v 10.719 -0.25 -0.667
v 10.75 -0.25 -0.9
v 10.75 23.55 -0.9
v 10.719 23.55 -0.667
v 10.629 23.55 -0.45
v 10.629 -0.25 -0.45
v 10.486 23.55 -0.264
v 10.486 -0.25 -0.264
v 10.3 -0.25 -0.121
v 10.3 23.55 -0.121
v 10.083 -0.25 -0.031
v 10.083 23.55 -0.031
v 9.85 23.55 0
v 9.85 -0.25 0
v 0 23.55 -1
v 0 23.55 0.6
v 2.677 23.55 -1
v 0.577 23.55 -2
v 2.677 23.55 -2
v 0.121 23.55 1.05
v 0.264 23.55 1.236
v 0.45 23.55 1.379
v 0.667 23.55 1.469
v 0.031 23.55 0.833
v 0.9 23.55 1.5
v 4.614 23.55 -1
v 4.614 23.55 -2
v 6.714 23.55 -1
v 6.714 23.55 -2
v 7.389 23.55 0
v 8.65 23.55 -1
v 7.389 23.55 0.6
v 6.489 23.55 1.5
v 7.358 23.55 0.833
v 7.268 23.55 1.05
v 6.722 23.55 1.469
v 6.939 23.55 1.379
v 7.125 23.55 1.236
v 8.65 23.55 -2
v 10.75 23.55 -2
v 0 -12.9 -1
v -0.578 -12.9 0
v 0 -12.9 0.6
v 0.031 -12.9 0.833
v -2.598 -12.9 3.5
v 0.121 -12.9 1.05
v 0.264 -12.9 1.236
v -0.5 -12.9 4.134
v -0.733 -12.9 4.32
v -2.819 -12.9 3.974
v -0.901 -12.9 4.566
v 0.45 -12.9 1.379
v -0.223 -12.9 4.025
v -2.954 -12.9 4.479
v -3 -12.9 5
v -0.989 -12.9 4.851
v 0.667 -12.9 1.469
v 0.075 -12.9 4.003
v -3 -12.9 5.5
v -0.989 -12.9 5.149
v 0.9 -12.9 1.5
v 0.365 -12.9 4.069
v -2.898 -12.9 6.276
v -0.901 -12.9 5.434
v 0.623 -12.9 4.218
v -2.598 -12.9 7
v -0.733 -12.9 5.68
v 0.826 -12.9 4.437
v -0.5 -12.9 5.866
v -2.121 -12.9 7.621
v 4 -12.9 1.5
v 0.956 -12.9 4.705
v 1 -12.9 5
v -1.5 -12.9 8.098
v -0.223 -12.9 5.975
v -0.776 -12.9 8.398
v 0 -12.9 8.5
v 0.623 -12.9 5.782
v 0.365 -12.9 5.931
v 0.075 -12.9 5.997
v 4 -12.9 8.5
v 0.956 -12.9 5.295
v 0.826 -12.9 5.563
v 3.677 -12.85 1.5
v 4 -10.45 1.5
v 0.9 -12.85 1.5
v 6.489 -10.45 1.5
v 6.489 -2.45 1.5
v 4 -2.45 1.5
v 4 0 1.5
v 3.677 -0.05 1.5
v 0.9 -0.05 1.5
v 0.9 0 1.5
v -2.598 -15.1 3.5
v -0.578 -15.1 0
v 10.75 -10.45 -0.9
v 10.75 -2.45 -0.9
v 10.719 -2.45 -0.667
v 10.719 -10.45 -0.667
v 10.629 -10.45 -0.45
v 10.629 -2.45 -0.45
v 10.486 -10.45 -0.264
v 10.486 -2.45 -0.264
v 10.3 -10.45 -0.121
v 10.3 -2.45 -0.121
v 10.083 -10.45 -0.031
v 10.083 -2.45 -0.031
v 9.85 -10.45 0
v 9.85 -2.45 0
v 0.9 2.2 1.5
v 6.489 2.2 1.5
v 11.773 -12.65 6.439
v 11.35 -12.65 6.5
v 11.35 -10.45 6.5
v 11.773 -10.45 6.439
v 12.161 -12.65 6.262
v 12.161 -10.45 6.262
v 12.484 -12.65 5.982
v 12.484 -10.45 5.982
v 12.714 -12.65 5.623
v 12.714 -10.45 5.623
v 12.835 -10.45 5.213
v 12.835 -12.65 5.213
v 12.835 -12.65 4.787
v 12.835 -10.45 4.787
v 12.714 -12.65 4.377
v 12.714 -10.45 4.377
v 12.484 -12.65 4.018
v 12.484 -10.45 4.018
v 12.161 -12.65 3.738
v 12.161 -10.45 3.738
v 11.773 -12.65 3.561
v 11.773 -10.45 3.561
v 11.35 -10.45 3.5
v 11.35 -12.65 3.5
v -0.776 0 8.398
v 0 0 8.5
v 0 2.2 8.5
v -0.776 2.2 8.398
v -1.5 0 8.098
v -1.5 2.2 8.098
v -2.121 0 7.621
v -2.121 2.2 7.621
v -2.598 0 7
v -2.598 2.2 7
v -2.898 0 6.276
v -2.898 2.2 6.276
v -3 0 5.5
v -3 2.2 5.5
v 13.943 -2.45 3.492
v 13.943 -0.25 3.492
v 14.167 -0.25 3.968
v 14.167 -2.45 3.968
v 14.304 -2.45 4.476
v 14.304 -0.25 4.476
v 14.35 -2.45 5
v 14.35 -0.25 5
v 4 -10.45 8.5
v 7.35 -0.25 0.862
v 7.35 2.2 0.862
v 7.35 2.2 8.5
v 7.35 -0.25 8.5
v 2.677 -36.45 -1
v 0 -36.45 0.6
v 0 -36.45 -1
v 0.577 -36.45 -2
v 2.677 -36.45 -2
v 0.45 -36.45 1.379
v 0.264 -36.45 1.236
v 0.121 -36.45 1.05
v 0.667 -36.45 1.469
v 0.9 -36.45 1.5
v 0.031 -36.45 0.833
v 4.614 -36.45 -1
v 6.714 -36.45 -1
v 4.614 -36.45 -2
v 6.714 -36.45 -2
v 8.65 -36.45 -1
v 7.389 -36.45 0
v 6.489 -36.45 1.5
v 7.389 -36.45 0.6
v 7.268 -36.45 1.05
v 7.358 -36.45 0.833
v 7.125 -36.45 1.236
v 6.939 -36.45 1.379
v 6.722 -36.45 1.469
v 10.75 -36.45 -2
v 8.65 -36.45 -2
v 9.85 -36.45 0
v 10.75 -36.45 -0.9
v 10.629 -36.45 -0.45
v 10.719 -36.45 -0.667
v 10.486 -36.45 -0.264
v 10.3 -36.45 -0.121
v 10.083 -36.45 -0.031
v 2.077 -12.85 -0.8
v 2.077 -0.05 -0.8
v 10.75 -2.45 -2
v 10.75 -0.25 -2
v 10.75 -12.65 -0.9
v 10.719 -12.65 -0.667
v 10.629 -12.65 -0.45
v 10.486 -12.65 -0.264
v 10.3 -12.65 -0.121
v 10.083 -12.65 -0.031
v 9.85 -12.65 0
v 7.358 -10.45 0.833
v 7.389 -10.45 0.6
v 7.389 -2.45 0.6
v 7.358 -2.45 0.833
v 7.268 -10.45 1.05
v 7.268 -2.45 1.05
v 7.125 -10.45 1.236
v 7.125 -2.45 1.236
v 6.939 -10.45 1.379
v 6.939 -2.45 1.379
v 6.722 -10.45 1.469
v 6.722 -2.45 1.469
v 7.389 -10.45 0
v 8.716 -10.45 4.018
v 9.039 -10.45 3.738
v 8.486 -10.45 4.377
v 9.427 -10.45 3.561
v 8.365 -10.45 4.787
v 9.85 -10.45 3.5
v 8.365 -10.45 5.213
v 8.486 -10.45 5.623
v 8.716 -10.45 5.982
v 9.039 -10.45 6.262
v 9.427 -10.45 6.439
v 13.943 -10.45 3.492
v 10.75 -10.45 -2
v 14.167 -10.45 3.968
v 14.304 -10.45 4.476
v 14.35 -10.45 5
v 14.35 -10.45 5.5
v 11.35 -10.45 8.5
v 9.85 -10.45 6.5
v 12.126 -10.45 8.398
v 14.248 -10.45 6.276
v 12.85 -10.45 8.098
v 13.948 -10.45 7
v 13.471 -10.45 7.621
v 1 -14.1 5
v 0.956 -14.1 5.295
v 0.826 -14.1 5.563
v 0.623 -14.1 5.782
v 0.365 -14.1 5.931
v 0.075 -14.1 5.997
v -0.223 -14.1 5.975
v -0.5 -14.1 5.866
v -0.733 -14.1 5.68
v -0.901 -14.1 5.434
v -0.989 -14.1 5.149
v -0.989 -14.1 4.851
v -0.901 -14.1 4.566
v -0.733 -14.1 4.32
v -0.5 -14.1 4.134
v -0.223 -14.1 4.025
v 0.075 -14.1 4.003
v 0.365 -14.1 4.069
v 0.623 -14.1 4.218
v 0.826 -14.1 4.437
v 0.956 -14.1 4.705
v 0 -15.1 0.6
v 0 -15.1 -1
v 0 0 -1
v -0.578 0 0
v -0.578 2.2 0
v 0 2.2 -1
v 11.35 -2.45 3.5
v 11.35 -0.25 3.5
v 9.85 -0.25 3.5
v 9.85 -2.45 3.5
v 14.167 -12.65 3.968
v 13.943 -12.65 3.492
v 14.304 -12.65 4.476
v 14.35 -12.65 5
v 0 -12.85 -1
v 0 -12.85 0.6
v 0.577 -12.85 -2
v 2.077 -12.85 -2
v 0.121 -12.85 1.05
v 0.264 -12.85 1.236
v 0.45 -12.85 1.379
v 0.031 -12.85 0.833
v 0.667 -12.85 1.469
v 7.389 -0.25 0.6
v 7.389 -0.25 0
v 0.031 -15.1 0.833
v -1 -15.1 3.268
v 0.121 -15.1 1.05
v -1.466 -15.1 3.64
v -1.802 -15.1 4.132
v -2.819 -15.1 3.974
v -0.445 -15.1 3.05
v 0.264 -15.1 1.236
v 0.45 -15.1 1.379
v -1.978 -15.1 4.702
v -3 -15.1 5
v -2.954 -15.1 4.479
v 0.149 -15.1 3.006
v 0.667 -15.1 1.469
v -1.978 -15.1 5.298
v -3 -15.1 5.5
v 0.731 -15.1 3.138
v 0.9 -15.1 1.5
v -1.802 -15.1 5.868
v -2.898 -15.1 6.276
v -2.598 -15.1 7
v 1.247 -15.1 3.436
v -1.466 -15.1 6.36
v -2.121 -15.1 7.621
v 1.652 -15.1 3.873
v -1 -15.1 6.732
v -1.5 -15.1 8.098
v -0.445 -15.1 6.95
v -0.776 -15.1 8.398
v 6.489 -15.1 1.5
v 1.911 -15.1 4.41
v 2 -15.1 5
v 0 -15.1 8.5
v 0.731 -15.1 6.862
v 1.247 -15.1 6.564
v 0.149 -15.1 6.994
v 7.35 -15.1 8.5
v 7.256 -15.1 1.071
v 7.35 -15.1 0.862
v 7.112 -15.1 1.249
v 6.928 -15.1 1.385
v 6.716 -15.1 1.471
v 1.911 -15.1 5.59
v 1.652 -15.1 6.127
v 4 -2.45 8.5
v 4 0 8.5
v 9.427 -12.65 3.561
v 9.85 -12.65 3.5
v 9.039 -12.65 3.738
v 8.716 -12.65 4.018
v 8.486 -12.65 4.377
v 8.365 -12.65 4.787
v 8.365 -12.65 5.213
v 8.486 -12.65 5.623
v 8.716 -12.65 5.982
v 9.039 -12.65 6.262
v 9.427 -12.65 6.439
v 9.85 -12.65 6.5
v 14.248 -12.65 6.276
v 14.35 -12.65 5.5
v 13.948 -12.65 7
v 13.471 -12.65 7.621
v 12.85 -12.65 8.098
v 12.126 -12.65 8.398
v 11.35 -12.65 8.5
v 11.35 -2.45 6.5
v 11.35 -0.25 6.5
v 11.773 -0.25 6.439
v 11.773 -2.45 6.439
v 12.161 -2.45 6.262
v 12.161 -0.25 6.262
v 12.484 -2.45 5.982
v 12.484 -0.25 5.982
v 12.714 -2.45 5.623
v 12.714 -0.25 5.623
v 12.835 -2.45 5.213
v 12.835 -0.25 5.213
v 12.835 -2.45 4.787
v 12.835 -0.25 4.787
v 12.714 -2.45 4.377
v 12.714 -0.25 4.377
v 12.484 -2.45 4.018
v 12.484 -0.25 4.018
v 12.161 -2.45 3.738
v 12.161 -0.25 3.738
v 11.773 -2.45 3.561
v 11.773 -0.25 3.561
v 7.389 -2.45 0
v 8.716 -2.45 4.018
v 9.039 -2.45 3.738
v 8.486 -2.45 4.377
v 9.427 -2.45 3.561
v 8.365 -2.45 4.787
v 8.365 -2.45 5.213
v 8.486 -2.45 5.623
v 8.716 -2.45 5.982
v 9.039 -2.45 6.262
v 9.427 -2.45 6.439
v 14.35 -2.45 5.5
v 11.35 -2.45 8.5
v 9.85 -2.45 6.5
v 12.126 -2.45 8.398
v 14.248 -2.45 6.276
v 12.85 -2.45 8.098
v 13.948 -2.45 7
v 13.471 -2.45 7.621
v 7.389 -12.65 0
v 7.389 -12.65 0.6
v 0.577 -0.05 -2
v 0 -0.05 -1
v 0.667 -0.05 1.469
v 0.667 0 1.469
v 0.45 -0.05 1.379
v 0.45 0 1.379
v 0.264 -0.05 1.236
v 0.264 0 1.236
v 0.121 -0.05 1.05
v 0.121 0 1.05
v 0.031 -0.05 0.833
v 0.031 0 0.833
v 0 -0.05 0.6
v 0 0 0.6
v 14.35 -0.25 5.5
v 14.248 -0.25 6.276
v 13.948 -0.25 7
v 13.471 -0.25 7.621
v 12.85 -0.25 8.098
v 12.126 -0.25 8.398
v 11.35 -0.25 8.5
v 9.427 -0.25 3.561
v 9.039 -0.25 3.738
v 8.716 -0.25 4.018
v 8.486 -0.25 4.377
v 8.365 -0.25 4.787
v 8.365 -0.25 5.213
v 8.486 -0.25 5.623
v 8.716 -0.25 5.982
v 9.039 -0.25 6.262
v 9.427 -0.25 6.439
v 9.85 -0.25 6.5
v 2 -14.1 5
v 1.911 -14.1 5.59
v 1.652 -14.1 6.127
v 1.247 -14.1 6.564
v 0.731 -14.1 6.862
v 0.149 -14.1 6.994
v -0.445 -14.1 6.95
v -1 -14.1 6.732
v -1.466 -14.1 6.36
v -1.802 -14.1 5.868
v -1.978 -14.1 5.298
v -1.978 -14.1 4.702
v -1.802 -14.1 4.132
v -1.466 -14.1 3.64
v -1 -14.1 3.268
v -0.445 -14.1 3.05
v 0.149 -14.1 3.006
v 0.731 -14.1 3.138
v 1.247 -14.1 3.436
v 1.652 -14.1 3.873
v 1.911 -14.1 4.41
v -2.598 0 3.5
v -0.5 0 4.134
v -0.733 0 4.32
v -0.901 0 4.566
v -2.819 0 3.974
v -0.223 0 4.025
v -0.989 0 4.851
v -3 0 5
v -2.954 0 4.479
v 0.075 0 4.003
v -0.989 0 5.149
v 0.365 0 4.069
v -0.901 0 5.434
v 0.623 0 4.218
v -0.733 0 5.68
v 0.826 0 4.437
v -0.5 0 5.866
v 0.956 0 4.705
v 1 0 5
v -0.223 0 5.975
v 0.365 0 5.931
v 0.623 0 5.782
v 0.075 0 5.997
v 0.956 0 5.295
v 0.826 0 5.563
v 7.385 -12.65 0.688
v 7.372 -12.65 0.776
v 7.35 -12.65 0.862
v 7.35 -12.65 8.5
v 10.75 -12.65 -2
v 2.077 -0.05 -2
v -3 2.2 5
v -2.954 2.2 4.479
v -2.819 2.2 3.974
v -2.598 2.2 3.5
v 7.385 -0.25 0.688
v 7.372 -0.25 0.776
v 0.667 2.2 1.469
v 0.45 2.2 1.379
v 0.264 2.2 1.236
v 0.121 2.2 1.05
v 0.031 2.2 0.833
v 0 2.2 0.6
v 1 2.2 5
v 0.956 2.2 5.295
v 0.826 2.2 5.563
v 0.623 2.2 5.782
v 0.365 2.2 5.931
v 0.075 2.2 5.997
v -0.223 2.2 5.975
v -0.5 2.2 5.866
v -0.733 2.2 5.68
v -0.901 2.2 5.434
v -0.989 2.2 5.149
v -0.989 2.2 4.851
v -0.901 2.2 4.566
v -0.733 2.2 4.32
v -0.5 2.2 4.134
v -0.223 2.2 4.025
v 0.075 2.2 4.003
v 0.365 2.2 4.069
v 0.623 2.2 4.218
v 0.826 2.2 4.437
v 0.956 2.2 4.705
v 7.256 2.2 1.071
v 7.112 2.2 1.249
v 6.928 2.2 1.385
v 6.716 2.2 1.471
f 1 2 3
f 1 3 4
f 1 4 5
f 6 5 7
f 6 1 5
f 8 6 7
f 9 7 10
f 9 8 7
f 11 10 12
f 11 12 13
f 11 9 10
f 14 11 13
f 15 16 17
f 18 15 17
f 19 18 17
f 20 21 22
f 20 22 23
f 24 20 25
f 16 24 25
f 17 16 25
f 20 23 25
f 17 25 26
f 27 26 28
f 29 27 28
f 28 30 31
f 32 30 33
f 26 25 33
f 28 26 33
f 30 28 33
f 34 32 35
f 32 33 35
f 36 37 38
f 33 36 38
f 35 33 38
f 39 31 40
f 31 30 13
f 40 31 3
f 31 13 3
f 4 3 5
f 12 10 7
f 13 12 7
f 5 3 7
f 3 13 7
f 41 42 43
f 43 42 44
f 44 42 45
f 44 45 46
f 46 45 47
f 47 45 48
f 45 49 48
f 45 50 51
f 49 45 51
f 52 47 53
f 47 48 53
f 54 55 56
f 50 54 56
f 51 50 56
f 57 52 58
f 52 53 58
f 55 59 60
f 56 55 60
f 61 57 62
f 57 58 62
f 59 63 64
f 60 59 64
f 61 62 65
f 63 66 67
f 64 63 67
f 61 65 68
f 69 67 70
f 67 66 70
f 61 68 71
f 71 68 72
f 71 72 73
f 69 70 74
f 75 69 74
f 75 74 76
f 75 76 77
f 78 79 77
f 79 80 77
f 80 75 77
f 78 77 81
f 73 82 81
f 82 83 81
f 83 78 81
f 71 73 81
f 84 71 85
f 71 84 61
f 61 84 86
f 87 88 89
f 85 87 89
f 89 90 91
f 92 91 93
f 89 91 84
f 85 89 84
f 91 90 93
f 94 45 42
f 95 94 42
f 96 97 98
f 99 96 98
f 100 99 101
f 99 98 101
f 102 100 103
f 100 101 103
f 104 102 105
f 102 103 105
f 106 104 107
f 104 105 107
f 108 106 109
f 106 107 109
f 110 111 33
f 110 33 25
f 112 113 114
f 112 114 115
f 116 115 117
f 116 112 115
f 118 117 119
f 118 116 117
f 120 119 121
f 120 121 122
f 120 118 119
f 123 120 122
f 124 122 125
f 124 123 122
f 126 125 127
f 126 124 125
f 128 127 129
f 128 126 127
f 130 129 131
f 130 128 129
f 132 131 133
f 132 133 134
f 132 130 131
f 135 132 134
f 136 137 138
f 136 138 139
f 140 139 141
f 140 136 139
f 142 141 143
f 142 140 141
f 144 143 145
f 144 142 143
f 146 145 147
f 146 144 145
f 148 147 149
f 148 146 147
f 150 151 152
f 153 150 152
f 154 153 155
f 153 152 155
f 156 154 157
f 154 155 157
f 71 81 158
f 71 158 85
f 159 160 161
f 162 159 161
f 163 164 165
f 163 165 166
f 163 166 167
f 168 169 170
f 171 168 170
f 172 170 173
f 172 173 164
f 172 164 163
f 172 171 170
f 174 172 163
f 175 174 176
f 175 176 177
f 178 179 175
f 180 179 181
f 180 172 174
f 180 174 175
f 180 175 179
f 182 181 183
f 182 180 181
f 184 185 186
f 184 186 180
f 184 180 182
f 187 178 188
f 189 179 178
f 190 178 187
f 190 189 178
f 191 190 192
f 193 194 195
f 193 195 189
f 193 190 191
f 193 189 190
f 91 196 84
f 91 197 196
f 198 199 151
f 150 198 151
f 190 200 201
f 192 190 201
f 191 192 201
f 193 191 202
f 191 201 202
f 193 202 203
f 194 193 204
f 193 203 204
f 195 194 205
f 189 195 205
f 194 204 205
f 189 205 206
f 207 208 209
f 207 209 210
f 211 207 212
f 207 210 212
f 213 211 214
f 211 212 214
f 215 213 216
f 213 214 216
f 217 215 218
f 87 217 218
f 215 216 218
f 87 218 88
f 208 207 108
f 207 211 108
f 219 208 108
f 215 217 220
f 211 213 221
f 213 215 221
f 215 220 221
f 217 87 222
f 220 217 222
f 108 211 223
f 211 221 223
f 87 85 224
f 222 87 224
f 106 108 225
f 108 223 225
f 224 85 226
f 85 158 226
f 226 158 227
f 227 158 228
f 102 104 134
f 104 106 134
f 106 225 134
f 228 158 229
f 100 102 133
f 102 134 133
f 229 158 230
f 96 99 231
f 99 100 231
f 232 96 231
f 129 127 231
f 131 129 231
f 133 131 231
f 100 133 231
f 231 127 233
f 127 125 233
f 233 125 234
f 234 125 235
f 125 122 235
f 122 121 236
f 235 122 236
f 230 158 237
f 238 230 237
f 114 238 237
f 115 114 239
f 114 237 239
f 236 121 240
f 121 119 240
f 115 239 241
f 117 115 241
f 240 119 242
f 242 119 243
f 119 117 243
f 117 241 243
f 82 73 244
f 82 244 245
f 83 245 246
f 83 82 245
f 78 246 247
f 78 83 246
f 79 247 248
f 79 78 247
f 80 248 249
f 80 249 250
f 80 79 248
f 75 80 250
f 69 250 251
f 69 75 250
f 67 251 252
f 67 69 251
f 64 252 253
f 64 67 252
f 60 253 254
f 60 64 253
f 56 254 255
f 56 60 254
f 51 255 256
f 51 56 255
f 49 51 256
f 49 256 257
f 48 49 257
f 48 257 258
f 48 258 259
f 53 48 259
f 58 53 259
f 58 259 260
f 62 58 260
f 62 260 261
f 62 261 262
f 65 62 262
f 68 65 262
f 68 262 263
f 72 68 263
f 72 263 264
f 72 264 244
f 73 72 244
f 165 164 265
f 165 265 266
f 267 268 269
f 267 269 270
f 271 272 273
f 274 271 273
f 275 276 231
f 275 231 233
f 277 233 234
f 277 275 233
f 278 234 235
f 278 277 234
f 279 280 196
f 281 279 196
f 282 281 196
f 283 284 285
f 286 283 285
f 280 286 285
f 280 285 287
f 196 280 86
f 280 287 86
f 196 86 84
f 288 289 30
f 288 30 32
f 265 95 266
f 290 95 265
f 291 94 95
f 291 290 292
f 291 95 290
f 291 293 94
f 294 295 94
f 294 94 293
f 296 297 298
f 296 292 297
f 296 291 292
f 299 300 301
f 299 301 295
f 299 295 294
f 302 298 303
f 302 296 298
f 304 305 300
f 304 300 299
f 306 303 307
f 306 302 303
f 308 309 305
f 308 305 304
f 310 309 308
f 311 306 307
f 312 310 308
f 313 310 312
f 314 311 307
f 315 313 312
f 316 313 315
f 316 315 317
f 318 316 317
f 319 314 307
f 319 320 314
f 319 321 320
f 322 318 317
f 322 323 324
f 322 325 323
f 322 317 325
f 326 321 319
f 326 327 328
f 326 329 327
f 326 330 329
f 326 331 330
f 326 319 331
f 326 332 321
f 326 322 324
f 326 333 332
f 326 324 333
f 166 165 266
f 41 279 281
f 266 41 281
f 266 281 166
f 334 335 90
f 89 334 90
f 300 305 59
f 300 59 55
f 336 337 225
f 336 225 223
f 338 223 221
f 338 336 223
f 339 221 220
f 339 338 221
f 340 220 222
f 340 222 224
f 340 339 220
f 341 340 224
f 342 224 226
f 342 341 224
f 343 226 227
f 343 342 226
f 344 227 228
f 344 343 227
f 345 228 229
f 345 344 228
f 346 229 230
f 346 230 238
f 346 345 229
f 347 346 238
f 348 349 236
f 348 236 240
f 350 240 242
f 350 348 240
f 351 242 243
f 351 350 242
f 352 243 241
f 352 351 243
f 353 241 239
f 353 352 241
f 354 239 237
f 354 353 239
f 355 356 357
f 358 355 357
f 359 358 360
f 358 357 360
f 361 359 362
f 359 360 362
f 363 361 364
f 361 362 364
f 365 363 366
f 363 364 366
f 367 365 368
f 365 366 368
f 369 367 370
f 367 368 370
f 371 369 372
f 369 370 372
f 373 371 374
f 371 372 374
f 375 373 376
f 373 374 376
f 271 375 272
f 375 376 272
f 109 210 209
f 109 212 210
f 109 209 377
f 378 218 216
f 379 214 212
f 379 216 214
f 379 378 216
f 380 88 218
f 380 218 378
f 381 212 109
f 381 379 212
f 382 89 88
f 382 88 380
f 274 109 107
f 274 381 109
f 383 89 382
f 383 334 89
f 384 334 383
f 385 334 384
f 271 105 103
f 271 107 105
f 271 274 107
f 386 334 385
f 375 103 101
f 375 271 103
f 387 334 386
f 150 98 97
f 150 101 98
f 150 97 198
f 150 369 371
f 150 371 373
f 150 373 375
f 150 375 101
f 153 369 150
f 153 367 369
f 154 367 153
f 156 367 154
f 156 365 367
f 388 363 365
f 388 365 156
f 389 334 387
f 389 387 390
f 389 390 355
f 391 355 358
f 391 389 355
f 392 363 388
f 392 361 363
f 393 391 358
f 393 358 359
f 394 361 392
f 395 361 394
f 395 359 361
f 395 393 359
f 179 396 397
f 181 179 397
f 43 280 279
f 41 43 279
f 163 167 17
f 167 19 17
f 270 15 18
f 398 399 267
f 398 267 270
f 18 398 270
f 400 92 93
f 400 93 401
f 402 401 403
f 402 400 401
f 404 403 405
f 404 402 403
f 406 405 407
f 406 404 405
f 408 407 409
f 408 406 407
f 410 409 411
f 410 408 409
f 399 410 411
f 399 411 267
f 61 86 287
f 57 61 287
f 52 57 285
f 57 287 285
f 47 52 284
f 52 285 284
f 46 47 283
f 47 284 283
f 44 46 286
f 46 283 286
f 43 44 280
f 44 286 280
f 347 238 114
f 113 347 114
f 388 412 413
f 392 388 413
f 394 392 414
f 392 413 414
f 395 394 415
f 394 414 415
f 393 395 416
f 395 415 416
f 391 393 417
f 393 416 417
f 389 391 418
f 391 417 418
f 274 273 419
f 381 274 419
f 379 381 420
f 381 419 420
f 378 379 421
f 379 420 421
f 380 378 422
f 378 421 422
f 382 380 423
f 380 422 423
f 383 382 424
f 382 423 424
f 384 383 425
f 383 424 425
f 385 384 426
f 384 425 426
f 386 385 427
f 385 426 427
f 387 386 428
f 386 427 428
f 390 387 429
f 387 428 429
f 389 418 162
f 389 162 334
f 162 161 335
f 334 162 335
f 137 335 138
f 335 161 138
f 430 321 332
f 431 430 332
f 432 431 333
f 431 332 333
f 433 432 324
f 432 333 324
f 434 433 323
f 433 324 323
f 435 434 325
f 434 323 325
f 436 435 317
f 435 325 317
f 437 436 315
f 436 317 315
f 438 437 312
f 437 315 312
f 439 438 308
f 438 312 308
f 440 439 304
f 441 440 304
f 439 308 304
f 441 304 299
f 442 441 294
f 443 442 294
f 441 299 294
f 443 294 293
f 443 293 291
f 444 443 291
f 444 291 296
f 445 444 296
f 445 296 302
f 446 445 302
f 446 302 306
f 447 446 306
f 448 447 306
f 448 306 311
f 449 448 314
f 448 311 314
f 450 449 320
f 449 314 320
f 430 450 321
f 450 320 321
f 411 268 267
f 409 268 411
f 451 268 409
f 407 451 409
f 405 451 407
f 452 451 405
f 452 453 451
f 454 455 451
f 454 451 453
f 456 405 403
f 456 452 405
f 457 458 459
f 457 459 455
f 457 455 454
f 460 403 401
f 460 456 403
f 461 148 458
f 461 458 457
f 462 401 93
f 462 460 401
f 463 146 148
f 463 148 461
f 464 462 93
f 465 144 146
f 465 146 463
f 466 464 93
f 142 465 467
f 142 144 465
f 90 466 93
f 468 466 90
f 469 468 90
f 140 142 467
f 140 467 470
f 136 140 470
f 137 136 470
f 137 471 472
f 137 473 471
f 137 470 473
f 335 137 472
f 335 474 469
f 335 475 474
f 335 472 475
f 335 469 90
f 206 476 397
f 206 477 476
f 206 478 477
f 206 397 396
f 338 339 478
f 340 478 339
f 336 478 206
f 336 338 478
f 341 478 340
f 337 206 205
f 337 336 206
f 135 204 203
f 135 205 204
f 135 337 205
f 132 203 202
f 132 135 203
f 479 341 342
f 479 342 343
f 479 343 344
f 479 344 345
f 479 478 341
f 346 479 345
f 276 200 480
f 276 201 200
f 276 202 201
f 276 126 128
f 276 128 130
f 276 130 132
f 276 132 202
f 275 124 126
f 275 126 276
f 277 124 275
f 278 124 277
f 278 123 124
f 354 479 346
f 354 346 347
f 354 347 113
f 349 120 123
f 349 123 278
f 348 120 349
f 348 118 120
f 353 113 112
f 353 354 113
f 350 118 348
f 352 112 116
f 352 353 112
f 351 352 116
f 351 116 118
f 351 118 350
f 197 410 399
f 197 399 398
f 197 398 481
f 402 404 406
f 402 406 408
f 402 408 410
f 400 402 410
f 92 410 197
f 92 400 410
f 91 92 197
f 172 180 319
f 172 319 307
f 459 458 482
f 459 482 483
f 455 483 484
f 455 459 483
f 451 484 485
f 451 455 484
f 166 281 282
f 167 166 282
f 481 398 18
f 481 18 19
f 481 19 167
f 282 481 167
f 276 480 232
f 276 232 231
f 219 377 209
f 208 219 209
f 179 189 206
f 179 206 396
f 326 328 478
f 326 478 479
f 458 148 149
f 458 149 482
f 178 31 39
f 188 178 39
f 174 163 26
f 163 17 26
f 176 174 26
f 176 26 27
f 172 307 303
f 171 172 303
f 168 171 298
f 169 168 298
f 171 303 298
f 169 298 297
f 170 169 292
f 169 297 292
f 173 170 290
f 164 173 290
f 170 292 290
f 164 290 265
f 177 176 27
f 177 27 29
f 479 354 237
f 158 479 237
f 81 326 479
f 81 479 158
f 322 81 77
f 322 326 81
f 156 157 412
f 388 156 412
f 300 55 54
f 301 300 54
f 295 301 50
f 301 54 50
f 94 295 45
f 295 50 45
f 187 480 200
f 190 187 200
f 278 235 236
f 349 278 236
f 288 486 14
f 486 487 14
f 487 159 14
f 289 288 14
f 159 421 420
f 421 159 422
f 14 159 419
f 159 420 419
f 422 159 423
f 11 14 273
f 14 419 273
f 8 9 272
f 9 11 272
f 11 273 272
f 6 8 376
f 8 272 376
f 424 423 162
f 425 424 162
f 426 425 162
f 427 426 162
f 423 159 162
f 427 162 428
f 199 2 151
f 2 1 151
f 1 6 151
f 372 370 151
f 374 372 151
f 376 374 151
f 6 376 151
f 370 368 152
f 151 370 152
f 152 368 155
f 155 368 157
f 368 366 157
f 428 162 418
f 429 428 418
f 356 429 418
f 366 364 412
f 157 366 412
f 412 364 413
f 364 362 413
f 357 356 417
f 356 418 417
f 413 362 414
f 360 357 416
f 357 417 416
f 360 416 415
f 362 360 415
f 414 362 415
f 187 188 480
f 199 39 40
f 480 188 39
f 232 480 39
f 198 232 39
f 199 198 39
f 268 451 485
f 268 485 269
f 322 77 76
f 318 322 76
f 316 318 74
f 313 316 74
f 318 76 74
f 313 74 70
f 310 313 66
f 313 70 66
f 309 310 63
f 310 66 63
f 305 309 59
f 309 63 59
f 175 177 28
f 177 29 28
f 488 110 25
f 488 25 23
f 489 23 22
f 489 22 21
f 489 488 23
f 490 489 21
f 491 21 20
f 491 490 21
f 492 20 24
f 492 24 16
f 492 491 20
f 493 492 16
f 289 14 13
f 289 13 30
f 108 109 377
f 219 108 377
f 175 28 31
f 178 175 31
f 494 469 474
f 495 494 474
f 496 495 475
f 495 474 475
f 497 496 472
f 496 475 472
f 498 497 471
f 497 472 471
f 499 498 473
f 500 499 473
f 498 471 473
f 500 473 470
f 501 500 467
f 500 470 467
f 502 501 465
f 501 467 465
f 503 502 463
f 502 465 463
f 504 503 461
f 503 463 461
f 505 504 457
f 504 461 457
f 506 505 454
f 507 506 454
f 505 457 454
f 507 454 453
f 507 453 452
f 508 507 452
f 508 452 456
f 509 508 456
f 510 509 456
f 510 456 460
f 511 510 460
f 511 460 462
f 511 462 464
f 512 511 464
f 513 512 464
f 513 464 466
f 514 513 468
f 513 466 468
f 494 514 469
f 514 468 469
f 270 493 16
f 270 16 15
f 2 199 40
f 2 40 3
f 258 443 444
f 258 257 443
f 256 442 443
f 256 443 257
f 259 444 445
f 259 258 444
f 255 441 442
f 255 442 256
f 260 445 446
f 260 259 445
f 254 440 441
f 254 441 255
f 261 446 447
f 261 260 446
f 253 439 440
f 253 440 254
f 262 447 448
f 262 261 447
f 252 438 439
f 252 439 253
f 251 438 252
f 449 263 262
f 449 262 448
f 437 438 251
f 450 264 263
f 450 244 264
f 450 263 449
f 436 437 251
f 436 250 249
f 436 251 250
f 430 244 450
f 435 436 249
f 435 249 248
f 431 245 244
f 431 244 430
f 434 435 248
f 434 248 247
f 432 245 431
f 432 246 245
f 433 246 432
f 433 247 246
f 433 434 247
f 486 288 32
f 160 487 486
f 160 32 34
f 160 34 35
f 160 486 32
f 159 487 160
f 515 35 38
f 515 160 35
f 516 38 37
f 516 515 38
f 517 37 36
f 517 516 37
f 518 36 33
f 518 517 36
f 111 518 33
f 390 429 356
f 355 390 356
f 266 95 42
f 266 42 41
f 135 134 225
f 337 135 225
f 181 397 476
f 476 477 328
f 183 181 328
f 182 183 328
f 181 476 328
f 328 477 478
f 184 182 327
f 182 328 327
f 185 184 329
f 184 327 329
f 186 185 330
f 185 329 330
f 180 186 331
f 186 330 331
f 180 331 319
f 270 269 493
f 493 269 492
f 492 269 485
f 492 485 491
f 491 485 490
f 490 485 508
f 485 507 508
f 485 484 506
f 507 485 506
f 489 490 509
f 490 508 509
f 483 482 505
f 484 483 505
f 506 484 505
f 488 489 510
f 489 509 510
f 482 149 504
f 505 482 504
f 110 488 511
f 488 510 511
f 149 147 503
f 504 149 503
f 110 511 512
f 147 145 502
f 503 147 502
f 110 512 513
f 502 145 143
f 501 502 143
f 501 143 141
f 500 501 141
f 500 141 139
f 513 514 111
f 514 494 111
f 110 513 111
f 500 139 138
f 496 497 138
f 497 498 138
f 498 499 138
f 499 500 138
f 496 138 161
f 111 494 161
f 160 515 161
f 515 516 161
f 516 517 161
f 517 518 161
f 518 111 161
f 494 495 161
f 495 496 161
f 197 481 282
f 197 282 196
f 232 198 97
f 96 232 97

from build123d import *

# Parameters (mm, degrees)
F1_R      = 1
F2_DEPTH  = 2.2
F4_DEPTH  = 0.25
F6_DEPTH  = 2.2
F9_DEPTH  = 30
F11_DEPTH = 6.4
F13_R     = 2
F13_R_2   = 1
F14_DEPTH = 1


# Not quite as in the source:
# - a feature names something its author has since deleted; it is built from what else it names


with BuildPart() as f2:
    # F1 (on Front) → F2 (new body)
    with BuildSketch(Plane.XZ):
        with BuildLine():
            Line((7.35, 2), (7.35, 8.5))
            Line((7.35, 8.5), (0, 8.5))
            ThreePointArc((0, 8.5), (-2.1213203436, 7.6213203436), (-3, 5.5))
            Line((-3, 5.5), (-3, 5))
            ThreePointArc((-3, 5), (-2.8977774789, 4.2235428647), (-2.5980762114, 3.5))
            Line((-2.5980762114, 3.5), (-0.5775284417, 0.0003086038))
            Line((-0.5775284417, 0.0003086038), (0, -1))
            Line((0, -1), (0, 0))
            Line((0, 0), (2, 0))
            Line((2, 0), (7.35, 0))
            Line((7.35, 0), (7.35, 2))
        make_face()
        with Locations((0, 5)):
            Circle(F1_R, mode=Mode.SUBTRACT)
    extrude(amount=-F2_DEPTH)

    # F3 (on Front) → F4 (join)
    with BuildSketch(Plane.XZ):
        Polygon((7.35, 8.5), (4, 8.5), (4, 2), (4, 0), (7.35, 0), (7.35, 2), align=None)
    extrude(amount=F4_DEPTH)

    # F5 (on face) → F6 (join)
    with BuildSketch(Plane.XZ.offset(0.25)):
        with BuildLine():
            ThreePointArc((13.9434358481, 3.491991213), (14.2465762155, 4.2190734812), (14.35, 5))
            Line((14.35, 5), (14.35, 5.5))
            ThreePointArc((14.35, 5.5), (13.4713203436, 7.6213203436), (11.35, 8.5))
            Line((11.35, 8.5), (4, 8.5))
            Line((4, 8.5), (4, 2))
            Line((4, 2), (4, 0))
            Line((4, 0), (7.3888939805, 0))
            Line((7.3888939805, 0), (10.75, -1))
            Line((10.75, -1), (10.75, -2))
            Line((10.75, -2), (13.9434358481, 3.491991213))
        make_face()
        with BuildLine():
            Line((11.35, 3.5), (9.85, 3.5))
            ThreePointArc((9.85, 3.5), (8.35, 5), (9.85, 6.5))
            Line((9.85, 6.5), (11.35, 6.5))
            ThreePointArc((11.35, 6.5), (12.85, 5), (11.35, 3.5))
        make_face(mode=Mode.SUBTRACT)
    extrude(amount=F6_DEPTH)

    # F8 (on offset) → F9 (join)
    with BuildSketch(Plane.XZ.offset(6.45)):
        with BuildLine():
            Line((10.75, -2), (10.75, -1))
            Line((10.75, -1), (10.75, -0.9))
            ThreePointArc((10.75, -0.9), (10.4863961031, -0.2636038969), (9.85, 0))
            Line((9.85, 0), (7.3888939805, 0))
            Line((7.3888939805, 0), (7.3888939805, 0.6))
            ThreePointArc((7.3888939805, 0.6), (7.1252900836, 1.2363961031), (6.4888939805, 1.5))
            Line((6.4888939805, 1.5), (0.9, 1.5))
            ThreePointArc((0.9, 1.5), (0.2636038969, 1.2363961031), (0, 0.6))
            Line((0, 0.6), (0, -1))
            Line((0, -1), (0.5773502692, -2))
            Line((0.5773502692, -2), (2.6773502692, -2))
            Line((2.6773502692, -2), (2.6773502692, -1))
            Line((2.6773502692, -1), (4.6136751346, -1))
            Line((4.6136751346, -1), (4.6136751346, -2))
            Line((4.6136751346, -2), (6.7136751346, -2))
            Line((6.7136751346, -2), (6.7136751346, -1))
            Line((6.7136751346, -1), (8.65, -1))
            Line((8.65, -1), (8.65, -2))
            Line((8.65, -2), (10.75, -2))
        make_face()
    extrude(amount=-F9_DEPTH)

    # F10 (on offset) → F11 (cut)
    with BuildSketch(Plane.XZ.offset(6.45)):
        with BuildLine():
            ThreePointArc((0.9, 1.5), (0.2636038969, 1.2363961031), (0, 0.6))
            Line((0, 0.6), (0, -1))
            Line((0, -1), (0.5773502692, -2))
            Line((0.5773502692, -2), (2.0773502692, -2))
            Line((2.0773502692, -2), (2.0773502692, -0.8))
            Line((2.0773502692, -0.8), (3.6773515204, 1.5))
            Line((3.6773515204, 1.5), (0.9, 1.5))
        make_face()
    extrude(amount=-F11_DEPTH, mode=Mode.SUBTRACT)

    # F12: F2 across plane


with BuildPart() as f2_1:
    add(f2.part)
    add(f2.part.mirror(Plane(origin=(8.5554041441, -6.45, 4.0498921838), x_dir=(1, 0, 0), z_dir=(0, -1, 0))))

    # F13 (on face) → F14 (cut)
    with BuildSketch(Plane.XZ.offset(15.1)):
        with Locations((0, 5)):
            Circle(F13_R)
        with Locations((0, 5)):
            Circle(F13_R_2, mode=Mode.SUBTRACT)
    extrude(amount=-F14_DEPTH, mode=Mode.SUBTRACT)


solid = f2_1.part
